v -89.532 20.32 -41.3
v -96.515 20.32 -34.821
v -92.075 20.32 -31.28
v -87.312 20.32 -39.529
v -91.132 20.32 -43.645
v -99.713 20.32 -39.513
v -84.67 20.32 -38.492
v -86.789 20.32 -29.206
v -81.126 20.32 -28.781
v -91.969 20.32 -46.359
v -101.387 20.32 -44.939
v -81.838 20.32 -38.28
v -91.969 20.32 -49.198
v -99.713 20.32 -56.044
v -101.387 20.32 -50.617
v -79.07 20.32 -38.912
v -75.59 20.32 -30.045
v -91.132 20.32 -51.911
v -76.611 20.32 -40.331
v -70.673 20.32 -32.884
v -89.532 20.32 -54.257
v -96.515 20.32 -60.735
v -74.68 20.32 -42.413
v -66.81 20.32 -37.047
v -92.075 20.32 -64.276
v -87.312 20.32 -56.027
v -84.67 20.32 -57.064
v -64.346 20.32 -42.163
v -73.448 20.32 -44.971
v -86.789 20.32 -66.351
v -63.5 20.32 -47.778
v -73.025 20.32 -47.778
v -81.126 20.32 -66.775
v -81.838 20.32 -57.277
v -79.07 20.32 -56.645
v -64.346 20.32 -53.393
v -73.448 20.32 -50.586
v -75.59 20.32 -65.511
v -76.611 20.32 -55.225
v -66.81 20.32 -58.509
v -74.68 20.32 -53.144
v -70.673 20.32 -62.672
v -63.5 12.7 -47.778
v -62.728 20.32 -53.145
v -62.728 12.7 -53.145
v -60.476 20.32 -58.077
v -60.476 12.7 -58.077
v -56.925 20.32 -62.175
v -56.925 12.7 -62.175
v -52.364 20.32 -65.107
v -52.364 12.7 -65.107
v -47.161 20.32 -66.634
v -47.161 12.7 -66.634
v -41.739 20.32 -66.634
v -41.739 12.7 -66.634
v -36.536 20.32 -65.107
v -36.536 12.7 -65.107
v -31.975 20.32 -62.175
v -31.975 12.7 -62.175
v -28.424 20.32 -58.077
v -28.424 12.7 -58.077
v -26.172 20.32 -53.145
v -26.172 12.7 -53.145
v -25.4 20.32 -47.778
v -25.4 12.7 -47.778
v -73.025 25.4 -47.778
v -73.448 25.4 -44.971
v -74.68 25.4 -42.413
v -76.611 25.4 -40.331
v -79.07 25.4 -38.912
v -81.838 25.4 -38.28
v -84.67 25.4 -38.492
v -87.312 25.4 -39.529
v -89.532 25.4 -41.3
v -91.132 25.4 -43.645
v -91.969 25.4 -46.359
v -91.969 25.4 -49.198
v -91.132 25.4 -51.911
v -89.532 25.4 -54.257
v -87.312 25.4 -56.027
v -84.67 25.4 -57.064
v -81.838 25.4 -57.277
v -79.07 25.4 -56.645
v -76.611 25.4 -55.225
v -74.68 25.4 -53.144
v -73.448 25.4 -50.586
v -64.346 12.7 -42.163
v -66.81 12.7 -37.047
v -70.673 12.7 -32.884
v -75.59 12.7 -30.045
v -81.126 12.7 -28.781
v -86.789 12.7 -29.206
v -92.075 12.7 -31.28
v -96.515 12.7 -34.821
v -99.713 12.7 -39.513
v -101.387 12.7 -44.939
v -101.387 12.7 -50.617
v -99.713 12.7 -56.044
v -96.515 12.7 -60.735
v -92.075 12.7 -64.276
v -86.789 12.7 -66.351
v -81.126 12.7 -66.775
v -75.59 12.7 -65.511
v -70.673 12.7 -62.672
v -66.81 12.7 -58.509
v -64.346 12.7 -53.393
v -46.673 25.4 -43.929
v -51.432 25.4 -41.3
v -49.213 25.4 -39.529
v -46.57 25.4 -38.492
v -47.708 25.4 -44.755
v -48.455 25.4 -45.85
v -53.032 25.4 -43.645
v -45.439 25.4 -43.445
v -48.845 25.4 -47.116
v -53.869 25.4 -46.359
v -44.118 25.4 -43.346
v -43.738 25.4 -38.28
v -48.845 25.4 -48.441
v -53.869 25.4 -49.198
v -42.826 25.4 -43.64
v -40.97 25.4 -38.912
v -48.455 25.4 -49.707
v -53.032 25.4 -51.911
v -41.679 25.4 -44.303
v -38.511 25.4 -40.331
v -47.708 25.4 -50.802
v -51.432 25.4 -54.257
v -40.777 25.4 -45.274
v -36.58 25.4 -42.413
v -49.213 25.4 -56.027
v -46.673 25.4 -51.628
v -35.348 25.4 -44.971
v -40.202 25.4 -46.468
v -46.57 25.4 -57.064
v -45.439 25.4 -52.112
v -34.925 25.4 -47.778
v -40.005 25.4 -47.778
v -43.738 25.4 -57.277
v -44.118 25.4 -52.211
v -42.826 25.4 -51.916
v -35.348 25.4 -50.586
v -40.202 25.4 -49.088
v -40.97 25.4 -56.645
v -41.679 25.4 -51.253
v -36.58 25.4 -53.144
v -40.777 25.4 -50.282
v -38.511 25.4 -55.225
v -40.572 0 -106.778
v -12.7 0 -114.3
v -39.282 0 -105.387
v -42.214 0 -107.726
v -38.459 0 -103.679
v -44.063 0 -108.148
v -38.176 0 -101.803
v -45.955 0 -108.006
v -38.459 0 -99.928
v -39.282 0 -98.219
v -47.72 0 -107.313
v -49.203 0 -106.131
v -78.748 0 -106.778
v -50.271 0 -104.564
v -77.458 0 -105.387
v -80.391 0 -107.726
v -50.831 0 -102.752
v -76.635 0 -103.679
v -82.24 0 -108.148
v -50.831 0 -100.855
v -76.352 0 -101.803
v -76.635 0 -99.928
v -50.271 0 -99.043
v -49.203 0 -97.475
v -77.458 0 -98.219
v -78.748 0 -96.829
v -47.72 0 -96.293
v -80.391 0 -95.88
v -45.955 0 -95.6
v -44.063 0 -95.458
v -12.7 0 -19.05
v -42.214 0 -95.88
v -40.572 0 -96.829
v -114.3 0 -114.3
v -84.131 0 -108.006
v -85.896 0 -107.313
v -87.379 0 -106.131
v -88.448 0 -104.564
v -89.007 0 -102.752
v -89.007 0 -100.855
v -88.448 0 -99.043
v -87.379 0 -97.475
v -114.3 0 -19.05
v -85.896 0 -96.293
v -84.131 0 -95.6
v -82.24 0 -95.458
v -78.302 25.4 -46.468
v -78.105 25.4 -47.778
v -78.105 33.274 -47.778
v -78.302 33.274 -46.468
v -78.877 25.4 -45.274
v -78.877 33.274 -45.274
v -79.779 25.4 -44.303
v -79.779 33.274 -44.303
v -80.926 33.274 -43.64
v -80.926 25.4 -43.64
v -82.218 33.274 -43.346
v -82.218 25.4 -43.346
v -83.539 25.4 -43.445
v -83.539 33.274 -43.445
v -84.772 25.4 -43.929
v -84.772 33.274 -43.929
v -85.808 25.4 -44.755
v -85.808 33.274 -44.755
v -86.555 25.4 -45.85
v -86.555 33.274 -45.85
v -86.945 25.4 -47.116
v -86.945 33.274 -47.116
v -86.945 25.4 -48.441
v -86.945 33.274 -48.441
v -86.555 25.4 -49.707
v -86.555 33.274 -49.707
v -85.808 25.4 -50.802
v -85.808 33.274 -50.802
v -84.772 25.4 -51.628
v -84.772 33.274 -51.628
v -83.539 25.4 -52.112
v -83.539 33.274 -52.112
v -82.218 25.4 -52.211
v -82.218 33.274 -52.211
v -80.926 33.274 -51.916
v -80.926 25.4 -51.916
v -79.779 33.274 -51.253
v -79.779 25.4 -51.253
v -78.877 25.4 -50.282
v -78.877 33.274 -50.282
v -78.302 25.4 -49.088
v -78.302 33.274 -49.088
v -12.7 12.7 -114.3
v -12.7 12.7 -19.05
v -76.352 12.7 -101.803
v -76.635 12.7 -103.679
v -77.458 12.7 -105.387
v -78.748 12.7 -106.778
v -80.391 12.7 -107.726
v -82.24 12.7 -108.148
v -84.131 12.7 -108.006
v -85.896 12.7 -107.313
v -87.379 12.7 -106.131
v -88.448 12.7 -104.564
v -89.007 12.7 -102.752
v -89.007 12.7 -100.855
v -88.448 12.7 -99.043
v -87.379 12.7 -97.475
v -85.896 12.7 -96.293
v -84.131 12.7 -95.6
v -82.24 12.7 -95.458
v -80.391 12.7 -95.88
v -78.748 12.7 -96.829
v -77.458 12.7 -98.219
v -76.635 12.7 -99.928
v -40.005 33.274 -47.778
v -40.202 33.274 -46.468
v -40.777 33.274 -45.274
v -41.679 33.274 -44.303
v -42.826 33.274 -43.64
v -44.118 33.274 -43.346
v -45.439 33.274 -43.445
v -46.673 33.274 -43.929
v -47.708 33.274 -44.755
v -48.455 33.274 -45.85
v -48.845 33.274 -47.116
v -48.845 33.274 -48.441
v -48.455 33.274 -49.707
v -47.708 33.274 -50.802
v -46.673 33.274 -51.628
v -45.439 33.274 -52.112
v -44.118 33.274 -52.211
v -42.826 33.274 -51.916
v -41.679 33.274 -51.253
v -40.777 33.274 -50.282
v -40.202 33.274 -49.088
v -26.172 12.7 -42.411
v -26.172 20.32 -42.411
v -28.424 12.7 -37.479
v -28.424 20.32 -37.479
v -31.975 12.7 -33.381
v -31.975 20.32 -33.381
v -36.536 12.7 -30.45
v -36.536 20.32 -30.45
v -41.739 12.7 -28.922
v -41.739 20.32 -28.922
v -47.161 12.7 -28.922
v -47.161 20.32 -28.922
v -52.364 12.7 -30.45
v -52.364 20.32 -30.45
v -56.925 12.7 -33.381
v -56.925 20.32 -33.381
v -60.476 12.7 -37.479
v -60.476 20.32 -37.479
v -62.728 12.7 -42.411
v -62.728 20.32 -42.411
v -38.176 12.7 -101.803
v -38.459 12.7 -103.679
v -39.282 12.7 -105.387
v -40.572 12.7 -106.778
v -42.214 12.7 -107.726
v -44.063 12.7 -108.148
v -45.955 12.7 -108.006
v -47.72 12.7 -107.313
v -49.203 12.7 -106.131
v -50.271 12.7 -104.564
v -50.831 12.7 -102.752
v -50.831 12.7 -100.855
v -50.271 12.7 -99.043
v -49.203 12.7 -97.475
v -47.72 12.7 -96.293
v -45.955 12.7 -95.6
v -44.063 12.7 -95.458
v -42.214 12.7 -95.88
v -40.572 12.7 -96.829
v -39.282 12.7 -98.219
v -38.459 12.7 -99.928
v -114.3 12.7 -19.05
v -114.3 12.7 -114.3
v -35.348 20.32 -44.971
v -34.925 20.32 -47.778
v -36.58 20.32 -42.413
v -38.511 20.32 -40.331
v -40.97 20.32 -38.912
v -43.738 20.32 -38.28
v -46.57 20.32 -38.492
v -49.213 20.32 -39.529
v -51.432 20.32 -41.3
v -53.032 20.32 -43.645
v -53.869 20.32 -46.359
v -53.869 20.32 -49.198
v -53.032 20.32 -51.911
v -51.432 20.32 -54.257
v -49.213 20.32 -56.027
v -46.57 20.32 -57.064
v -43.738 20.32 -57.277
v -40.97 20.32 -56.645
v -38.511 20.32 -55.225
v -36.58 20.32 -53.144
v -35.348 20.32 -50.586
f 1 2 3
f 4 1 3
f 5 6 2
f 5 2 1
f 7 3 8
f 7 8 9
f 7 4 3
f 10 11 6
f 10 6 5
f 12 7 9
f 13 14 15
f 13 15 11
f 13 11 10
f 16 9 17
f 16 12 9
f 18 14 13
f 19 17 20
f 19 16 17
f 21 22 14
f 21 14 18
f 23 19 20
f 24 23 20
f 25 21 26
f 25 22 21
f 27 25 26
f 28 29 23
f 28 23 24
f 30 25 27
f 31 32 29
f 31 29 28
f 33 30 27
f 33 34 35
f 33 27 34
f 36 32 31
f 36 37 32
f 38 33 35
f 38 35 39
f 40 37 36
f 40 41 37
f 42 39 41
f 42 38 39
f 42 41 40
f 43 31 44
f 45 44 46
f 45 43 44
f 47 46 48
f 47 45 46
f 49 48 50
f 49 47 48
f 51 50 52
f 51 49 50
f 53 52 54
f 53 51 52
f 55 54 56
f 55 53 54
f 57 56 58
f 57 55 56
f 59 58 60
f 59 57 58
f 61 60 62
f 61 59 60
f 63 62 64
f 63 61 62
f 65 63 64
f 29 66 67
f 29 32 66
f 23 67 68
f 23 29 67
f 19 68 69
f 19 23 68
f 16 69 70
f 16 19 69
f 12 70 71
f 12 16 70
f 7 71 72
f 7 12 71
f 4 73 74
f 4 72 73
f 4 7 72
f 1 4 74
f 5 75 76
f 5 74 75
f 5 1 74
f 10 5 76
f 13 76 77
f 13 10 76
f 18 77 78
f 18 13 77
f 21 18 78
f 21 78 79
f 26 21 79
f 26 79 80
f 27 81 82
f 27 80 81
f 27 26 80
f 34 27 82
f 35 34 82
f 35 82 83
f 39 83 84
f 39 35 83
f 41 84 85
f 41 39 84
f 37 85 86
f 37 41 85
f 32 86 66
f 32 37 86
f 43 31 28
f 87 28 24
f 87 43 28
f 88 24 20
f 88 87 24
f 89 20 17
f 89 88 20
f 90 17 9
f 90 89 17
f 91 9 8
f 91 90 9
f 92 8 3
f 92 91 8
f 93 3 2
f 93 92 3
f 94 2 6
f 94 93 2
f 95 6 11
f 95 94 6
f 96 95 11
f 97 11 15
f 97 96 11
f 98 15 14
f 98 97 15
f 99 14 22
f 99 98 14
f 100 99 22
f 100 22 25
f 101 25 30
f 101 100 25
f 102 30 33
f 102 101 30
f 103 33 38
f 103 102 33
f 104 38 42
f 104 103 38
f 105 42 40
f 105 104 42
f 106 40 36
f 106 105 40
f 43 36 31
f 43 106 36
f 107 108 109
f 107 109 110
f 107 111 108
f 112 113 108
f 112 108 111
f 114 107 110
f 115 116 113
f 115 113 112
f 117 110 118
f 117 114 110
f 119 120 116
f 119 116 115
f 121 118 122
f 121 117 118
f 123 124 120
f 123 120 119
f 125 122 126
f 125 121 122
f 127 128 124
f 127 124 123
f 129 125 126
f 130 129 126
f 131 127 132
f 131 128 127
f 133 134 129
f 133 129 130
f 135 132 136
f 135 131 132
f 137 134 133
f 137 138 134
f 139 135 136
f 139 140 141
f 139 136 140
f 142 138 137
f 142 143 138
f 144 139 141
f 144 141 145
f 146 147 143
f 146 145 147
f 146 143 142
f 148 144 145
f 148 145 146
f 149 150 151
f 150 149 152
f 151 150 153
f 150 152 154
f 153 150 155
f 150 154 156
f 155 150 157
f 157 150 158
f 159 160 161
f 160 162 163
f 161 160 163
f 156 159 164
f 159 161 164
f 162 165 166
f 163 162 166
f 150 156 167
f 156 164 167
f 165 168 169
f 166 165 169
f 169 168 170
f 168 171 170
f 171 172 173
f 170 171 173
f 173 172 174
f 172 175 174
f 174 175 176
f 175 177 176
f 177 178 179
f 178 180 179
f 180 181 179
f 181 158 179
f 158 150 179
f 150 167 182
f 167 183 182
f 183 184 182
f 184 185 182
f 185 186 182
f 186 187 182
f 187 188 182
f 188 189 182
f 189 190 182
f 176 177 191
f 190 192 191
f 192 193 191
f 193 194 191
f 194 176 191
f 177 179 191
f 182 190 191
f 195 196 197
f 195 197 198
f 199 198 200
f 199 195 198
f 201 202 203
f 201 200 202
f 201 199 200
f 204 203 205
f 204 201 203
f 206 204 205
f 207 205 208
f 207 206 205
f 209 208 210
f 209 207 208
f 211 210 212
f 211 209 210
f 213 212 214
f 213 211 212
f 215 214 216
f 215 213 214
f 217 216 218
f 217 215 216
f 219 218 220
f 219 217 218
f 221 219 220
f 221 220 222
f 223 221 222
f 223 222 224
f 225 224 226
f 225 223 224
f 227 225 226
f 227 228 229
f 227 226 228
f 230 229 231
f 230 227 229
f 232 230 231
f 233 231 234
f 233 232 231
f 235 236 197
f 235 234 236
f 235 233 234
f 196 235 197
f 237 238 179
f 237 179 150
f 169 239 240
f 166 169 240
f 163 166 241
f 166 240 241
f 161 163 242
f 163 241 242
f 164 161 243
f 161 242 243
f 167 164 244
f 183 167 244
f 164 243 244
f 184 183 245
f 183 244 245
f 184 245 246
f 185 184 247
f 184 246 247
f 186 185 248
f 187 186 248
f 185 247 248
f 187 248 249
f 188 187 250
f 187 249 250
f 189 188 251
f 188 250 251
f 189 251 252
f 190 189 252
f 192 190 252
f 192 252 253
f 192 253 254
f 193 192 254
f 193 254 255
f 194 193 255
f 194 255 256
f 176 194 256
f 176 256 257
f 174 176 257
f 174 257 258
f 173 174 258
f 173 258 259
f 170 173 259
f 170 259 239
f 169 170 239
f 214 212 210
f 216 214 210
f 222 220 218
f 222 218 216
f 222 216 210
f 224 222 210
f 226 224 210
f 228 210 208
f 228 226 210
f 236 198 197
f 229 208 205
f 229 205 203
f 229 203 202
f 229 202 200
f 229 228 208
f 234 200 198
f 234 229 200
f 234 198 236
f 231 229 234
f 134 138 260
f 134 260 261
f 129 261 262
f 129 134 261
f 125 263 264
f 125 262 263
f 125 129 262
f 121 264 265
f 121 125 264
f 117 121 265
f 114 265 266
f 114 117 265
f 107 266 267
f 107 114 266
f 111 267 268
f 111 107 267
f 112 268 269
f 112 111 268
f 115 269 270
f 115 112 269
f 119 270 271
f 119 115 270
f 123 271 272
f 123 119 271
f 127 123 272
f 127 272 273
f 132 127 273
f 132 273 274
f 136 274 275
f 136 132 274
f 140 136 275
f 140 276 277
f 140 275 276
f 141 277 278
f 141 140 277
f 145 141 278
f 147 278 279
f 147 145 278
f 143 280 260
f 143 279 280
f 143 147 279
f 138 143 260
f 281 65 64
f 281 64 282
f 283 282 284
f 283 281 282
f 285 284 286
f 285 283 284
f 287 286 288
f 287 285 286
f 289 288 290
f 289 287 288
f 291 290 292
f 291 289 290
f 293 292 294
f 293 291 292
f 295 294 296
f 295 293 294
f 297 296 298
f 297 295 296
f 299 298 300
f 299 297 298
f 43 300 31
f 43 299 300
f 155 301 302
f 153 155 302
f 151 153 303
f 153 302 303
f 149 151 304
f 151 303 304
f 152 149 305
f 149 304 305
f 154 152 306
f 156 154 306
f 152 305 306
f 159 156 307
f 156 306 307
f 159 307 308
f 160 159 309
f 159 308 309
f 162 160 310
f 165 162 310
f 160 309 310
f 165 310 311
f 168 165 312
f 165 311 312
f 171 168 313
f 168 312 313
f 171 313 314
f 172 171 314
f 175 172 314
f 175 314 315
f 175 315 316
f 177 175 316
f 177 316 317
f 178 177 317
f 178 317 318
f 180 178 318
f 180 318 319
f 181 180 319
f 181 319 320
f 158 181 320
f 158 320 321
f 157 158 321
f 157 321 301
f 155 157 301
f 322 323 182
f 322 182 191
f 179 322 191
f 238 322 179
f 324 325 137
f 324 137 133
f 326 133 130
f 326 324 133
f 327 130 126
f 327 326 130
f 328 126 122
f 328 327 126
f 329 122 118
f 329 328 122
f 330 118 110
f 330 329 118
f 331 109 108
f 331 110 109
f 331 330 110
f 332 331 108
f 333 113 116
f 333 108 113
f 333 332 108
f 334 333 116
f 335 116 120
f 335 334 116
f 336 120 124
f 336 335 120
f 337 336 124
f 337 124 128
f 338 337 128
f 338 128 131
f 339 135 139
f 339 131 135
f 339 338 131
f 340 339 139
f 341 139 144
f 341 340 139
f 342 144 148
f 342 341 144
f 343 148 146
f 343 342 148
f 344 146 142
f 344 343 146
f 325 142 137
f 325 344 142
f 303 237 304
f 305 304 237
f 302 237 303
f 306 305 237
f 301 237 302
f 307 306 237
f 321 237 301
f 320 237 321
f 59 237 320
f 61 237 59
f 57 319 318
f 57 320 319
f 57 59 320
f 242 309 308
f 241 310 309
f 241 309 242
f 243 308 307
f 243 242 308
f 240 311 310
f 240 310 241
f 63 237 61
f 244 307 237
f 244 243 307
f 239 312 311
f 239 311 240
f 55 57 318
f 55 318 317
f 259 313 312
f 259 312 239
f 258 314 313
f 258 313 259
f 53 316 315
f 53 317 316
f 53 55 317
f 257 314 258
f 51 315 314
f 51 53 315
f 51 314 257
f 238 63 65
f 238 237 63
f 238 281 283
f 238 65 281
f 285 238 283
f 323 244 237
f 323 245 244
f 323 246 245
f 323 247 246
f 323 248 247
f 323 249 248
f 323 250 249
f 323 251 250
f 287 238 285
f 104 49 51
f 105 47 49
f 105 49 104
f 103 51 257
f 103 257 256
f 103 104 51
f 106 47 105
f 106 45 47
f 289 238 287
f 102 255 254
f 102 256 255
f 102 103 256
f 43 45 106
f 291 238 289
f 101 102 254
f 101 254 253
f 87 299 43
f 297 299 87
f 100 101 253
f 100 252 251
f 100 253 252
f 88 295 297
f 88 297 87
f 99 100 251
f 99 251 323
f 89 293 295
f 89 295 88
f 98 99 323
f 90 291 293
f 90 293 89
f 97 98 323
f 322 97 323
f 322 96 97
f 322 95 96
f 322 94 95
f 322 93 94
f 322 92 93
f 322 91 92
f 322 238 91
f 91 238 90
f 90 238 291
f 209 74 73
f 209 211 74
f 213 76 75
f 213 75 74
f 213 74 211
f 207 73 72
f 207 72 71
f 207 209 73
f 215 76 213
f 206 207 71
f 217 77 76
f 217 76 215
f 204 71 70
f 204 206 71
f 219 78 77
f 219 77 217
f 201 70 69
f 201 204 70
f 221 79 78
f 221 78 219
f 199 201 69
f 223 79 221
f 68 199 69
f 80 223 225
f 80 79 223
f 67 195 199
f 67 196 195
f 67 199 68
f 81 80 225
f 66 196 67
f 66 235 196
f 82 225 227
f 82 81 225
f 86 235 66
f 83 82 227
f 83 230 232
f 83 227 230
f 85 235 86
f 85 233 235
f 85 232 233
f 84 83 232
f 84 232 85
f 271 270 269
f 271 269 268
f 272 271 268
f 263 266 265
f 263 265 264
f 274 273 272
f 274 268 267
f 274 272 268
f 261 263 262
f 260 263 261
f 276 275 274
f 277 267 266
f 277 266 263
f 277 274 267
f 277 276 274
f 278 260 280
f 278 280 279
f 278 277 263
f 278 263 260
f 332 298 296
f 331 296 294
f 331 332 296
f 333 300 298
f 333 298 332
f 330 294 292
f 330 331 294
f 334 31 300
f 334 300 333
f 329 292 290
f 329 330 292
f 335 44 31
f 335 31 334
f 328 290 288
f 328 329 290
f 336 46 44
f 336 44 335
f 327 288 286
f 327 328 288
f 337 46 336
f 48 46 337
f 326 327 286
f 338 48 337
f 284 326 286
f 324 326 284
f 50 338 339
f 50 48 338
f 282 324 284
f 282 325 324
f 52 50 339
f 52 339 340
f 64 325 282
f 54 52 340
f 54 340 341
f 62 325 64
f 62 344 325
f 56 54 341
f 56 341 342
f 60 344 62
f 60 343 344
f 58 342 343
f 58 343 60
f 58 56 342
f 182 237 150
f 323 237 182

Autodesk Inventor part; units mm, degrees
ref_plane "YZ Plane" through (0, 0, 0) normal (1, 0, 0) x (0, 1, 0)
ref_plane "XZ Plane" through (0, 0, 0) normal (0, 1, 0) x (-1, 0, 0)
ref_plane "XY Plane" through (0, 0, 0) normal (0, 0, 1) x (1, 0, 0)
sketch "Sketch9" plane through (0, 0, 0) normal (0, 1, 0) x (-1, 0, 0)
  line L0 (0, 0) -> (127, 0)
  line L1 (127, 0) -> (127, -127)
  line L2 (127, -127) -> (0, -127)
  line L3 (0, -127) -> (0, 0)
  dimension "d29" = 127
  dimension "d30" = 127
extrude "Extrusion9" add sketch "Sketch9" along normal blind 12.7
sketch "Sketch10" plane through (0, 12.7, 0) normal (0, 1, 0) x (1, 0, 0)
  line L0 (-127, 127) -> (-127, 0) projected
  line L1 (-127, 0) -> (0, 0) projected
  line L2 (0, 0) -> (0, 127) projected
  line L3 (0, 127) -> (-127, 127) projected
  circle A0 centre (-89.0778, 50.9016) radius 19.0881
  circle A1 centre (-38.1762, 50.9016) radius 19.0881
  circle A2 centre (-82.7151, 101.8032) radius 6.3627
  circle A3 centre (-44.5389, 101.8032) radius 6.3627
  point P0 (-38.1762, 101.8032)
  dimension "d69" = 12.7254
  dimension "d70" = 12.7254
extrude "Extrusion10" cut sketch "Sketch10" against normal through all contours A2 | A3
sketch "Sketch11" plane through (0, 12.7, 0) normal (0, 1, 0) x (1, 0, 0)
  circle A0 centre (-82.55, 47.7782) radius 19.05
  circle A1 centre (-44.5389, 101.8032) radius 6.3627 projected
  line L0 (-127, 0) -> (0, 0) projected
  circle A2 centre (-44.45, 47.7782) radius 19.05
  line L1 (-44.5389, 101.8032) -> (-44.5389, 95.4405)
  point P0 (-63.5, 47.7782)
  dimension "d47" = 38.1
  dimension "d48" = 38.1
extrude "Extrusion11" add sketch "Sketch11" along normal blind 7.62 contours A0 | A2
sketch "Sketch12" plane through (-127, 0, 0) normal (0, 0, 1) x (1, 0, 0)
  line L0 (0, 0) -> (0, 12.7) projected
  line L1 (127, 0) -> (0, 0) projected
  line L2 (0, 12.7) -> (127, 12.7)
  line L3 (127, 12.7) -> (127, 0)
  line L4 (127, 0) -> (0, 0)
  line L5 (0, 0) -> (0, 12.7)
extrude "Extrusion12" cut sketch "Sketch12" against normal blind 19.05
sketch "Sketch13" plane through (0, 0, -127) normal (0, 0, -1) x (-1, 0, 0)
  line L0 (0, 12.7) -> (127, 12.7) projected
  line L1 (127, 0) -> (127, 12.7) projected
  line L2 (0, 12.7) -> (127, 12.7)
  line L3 (127, 12.7) -> (127, 0)
  line L4 (127, 0) -> (0, 0)
  line L5 (0, 0) -> (0, 12.7)
extrude "Extrusion13" cut sketch "Sketch13" against normal blind 12.7
sketch "Sketch14" plane through (-127, 0, -19.05) normal (-1, 0, 0) x (0, 0, 1)
  line L0 (-95.25, 12.7) -> (0, 12.7) projected
  line L1 (-95.25, 0) -> (0, 0) projected
  line L2 (-95.25, 12.7) -> (0, 12.7)
  line L3 (0, 12.7) -> (0, 0)
  line L4 (0, 0) -> (-95.25, 0)
  line L5 (-95.25, 0) -> (-95.25, 12.7)
  point P0 (19.05, 0)
  point P1 (0, 12.7)
extrude "Extrusion14" cut sketch "Sketch14" against normal blind 12.7
sketch "Sketch15" plane through (0, 0, -19.05) normal (1, 0, 0) x (0, 0, -1)
  line L0 (0, 12.7) -> (0, 0) projected
  line L1 (95.25, 0) -> (95.25, 12.7) projected
  line L2 (0, 12.7) -> (95.25, 12.7)
  line L3 (95.25, 12.7) -> (95.25, 0)
  line L4 (95.25, 0) -> (0, 0)
  line L5 (0, 0) -> (0, 12.7)
  point P0 (-19.05, 0)
extrude "Extrusion15" cut sketch "Sketch15" against normal blind 12.7
sketch "Sketch16" plane through (-44.45, 20.32, -47.7782) normal (0, 1, 0) x (1, 0, 0)
  circle A0 centre (0, 0) radius 9.525
  point P0 (44.45, -47.7782)
  dimension "d59" = 19.05
extrude "Extrusion16" add sketch "Sketch16" along normal blind 5.08
sketch "Sketch17" plane through (-82.55, 20.32, -47.7782) normal (0, 1, 0) x (1, 0, 0)
  circle A0 centre (0, 0) radius 9.525
  point P0 (82.55, -47.7782)
  dimension "d62" = 19.05
extrude "Extrusion17" add sketch "Sketch17" along normal blind 5.08
sketch "Sketch18" plane through (-44.45, 25.4, -47.7782) normal (0, 1, 0) x (1, 0, 0)
  circle A0 centre (0, 0) radius 4.445
  circle A1 centre (-38.1, 0) radius 19.05 projected
  circle A2 centre (-38.1, 0) radius 4.445
  point P0 (44.45, -47.7782)
  point P1 (-19.05, 0)
  dimension "d65" = 8.89
  dimension "d66" = 8.89
extrude "Extrusion18" add sketch "Sketch18" along normal blind 7.874 contours A0 | A2
sketch "Sketch19" plane through (0, 12.7, 0) normal (0, 1, 0) x (1, 0, 0)
  point P0 (0, 0)
sketch "Sketch20" plane through (0, 12.7, 0) normal (0, 1, 0) x (1, 0, 0)
  point P0 (0, 0)
sketch "Sketch21" plane through (-44.45, 33.274, -47.7782) normal (0, 1, 0) x (1, 0, 0)
  point P0 (44.45, -47.7782)
properties part number "Gripping Claws" material "Nickel-Copper Alloy 400"
